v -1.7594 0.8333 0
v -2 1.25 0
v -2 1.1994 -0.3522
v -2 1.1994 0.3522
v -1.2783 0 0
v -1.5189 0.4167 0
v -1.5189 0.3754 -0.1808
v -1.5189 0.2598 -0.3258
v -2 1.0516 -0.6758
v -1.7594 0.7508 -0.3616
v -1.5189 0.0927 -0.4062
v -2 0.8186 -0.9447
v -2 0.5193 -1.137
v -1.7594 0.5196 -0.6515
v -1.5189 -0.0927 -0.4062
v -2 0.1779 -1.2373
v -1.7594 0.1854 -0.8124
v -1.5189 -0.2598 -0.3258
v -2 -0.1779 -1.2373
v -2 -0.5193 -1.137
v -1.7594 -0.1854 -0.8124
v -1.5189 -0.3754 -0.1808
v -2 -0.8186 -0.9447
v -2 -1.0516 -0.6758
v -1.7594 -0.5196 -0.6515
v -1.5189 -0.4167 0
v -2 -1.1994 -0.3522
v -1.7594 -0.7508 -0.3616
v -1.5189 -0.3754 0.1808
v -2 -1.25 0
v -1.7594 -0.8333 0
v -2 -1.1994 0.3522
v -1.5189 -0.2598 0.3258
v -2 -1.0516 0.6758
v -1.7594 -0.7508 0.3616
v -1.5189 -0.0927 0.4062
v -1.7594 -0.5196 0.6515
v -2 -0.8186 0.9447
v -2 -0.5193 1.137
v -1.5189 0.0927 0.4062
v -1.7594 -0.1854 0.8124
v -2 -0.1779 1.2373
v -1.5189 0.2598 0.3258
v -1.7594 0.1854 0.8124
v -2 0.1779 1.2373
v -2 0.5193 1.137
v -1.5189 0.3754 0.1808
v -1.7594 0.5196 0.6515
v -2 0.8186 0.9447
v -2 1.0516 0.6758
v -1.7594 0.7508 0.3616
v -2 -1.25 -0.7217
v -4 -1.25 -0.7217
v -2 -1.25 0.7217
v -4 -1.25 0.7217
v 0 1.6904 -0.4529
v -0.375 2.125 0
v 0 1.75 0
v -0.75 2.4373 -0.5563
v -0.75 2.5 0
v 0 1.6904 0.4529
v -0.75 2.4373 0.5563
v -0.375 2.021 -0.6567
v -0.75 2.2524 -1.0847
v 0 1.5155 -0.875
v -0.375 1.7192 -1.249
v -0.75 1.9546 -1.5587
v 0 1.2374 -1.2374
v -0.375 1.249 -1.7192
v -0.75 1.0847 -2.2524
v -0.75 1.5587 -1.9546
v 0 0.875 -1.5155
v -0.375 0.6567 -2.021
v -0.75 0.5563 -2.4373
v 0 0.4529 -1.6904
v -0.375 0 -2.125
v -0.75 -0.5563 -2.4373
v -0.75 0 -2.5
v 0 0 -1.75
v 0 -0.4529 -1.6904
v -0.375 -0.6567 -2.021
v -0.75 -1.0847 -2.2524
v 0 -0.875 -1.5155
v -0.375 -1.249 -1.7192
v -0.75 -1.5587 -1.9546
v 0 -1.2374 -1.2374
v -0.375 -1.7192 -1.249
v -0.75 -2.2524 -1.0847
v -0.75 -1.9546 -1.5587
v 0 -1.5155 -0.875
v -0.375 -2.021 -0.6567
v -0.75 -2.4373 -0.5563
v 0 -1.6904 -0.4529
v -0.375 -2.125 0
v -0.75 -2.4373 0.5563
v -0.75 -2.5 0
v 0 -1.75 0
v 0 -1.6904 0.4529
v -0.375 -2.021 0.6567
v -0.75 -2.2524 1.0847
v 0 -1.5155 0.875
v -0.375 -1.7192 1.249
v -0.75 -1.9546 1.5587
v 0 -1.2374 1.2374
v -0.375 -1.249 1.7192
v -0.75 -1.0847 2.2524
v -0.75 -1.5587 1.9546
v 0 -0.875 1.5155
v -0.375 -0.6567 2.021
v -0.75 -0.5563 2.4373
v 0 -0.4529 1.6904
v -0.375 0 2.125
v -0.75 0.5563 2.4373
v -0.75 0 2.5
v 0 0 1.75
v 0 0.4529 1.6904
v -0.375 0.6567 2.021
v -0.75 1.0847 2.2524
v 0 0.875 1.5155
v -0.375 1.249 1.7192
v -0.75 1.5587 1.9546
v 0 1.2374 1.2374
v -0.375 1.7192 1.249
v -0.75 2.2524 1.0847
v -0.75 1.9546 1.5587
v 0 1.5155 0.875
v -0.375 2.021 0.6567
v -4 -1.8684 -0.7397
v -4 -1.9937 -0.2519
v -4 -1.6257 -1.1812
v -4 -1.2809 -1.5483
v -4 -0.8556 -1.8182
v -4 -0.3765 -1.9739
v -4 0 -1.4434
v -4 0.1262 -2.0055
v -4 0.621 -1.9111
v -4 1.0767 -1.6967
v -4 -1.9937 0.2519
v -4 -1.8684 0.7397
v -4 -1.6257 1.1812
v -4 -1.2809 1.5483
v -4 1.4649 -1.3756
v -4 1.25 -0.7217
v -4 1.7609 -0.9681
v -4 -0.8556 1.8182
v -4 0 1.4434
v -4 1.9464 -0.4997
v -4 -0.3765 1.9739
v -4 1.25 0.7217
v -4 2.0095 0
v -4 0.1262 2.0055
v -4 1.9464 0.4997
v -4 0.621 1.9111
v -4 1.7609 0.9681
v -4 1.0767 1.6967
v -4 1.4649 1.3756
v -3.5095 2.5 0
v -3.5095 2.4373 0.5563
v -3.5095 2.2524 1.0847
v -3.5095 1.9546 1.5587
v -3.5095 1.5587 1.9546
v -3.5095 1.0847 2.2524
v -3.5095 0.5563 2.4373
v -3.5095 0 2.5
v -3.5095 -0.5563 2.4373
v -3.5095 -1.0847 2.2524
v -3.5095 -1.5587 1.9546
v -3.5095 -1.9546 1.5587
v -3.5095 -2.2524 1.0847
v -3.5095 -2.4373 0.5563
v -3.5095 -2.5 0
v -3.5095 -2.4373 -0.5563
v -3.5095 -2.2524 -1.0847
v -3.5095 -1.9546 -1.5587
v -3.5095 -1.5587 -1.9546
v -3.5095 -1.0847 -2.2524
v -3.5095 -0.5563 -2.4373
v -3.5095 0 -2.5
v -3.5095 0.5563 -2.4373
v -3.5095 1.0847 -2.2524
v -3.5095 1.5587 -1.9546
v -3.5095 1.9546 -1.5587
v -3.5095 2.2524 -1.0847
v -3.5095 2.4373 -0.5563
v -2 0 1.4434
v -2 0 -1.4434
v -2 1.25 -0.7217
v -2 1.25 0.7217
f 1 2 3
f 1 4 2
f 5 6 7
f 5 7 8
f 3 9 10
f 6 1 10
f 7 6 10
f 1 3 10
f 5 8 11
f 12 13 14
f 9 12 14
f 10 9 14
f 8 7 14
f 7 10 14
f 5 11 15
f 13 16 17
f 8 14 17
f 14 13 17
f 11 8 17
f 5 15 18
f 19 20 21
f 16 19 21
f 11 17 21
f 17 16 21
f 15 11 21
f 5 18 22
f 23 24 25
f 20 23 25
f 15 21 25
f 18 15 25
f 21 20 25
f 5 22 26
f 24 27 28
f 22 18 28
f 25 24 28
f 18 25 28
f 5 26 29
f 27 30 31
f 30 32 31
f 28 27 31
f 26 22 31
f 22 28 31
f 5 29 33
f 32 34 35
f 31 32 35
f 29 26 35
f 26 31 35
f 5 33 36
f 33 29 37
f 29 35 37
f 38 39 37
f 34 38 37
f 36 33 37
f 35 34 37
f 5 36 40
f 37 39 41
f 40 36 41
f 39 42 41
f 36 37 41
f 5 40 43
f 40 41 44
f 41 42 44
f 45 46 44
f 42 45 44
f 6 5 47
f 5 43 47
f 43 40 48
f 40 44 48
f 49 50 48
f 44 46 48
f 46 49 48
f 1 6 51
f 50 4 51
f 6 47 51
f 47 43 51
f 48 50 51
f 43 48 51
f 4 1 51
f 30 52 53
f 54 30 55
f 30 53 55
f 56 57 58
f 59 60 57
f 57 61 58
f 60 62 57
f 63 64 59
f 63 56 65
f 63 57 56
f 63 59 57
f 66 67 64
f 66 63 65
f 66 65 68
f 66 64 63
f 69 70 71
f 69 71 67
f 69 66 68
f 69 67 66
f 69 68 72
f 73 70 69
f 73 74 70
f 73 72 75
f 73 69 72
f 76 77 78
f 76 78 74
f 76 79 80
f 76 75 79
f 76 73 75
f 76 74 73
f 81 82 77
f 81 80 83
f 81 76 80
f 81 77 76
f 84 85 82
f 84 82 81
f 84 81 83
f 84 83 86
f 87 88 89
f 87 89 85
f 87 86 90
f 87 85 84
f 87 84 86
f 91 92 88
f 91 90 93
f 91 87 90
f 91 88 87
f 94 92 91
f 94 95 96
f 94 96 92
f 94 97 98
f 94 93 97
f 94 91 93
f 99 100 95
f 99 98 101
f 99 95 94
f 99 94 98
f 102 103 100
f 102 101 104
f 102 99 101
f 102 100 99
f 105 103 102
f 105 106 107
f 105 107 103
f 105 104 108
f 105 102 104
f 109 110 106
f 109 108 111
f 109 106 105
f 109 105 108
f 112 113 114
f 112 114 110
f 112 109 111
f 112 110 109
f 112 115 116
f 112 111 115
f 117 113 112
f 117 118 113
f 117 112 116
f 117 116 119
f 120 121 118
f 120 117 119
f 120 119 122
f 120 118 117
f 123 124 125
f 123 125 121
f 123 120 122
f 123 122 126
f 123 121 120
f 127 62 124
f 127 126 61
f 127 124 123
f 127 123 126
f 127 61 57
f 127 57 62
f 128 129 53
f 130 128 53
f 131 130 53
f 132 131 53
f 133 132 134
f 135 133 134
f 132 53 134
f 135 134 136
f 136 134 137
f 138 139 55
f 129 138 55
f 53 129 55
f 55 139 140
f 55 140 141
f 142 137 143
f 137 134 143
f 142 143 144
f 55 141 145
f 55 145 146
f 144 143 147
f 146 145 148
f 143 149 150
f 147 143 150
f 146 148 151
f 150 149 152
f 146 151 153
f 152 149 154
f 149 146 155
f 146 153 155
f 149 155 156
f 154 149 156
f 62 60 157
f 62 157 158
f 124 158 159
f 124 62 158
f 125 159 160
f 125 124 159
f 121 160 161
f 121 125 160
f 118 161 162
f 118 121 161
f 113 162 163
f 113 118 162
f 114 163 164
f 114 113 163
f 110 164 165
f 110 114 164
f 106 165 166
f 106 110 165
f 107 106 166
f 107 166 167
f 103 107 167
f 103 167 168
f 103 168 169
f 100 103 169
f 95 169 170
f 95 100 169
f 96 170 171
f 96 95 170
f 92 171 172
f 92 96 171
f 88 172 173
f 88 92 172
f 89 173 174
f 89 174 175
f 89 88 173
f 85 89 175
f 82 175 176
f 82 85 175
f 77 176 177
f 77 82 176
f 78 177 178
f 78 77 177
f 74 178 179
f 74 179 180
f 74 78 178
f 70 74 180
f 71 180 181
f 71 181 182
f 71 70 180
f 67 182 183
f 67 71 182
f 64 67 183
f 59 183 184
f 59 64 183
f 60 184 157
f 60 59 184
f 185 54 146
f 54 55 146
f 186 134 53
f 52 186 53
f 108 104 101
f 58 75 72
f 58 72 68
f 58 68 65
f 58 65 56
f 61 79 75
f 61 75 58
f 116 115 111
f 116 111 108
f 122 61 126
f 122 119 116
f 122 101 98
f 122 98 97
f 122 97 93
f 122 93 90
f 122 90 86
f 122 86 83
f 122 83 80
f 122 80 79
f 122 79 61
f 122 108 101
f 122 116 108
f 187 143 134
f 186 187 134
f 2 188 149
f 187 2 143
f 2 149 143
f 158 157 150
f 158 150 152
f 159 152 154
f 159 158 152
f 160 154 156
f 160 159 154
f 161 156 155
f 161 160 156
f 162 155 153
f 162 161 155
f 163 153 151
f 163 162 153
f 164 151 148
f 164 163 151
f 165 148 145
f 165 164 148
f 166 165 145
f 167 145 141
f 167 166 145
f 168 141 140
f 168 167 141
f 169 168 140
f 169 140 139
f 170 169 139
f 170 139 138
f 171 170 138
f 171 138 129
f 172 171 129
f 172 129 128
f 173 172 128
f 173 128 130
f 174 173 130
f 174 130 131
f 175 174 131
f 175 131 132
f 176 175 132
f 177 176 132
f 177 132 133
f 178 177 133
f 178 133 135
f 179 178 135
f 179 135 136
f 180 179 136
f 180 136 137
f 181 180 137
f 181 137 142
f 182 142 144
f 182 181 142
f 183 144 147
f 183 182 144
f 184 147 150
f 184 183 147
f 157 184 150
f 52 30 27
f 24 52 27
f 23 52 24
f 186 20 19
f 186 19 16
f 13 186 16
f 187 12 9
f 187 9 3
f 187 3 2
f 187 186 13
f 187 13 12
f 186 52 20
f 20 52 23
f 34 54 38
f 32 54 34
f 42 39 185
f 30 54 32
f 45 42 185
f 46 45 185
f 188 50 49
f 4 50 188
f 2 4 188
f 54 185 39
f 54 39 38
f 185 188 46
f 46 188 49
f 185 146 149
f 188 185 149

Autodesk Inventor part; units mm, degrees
sketch "Sketch_1" plane through (0, 0, 0) normal (0, 0, 1) x (1, 0, 0)
  line L0 (0, 0) -> (-4, 0)
  line L1 (-4, 0) -> (-4, 2.0095)
  line L2 (-4, 2.0095) -> (-3.5095, 2.5)
  line L3 (-3.5095, 2.5) -> (-0.75, 2.5)
  line L4 (-0.75, 2.5) -> (0, 1.75)
  line L5 (0, 1.75) -> (0, 0)
  line L6 (0, 0) -> (-4, 0)
revolve "Revolution1" add sketch "Sketch_1" angle 360 about axis through (0, 0, 0) along (1, 0, 0)
thread "Thread1" size "M5x0.8" class "6g" standard "ISO Metric profile" full length
sketch "Sketch_2" plane through (-4, 0, 0) normal (-1, 0, 0) x (0, 1, 0)
  line L0 (-1.25, 0.7217) -> (-1.25, -0.7217)
  line L1 (-1.25, -0.7217) -> (0, -1.4434)
  line L2 (0, -1.4434) -> (1.25, -0.7217)
  line L3 (1.25, -0.7217) -> (1.25, 0.7217)
  line L4 (1.25, 0.7217) -> (0, 1.4434)
  line L5 (0, 1.4434) -> (-1.25, 0.7217)
extrude "Extrusion1" cut sketch "Sketch_2" against normal blind 2
sketch "Sketch_3" plane through (0, 0, 0) normal (0, 0, 1) x (1, 0, 0)
  line L0 (-1.2783, 0) -> (-2, 0)
  line L1 (-2, 0) -> (-2, 1.25)
  line L2 (-2, 1.25) -> (-1.2783, 0)
  line L3 (-1.2783, 0) -> (-2, 0)
revolve "Revolution2" cut sketch "Sketch_3" angle 360 about axis through (-1.2783, 0, 0) along (1, 0, 0)
ref_plane "CP_XY" through (0, 0, 0) normal (1, 0, 0) x (0, 0, -1)
ref_plane "CP_YZ" through (0, 0, 0) normal (0, 0, -1) x (0, 1, 0)
ref_plane "CP_ZX" through (0, 0, 0) normal (0, 1, 0) x (1, 0, 0)
properties part number "SET-SCREW5-4"
